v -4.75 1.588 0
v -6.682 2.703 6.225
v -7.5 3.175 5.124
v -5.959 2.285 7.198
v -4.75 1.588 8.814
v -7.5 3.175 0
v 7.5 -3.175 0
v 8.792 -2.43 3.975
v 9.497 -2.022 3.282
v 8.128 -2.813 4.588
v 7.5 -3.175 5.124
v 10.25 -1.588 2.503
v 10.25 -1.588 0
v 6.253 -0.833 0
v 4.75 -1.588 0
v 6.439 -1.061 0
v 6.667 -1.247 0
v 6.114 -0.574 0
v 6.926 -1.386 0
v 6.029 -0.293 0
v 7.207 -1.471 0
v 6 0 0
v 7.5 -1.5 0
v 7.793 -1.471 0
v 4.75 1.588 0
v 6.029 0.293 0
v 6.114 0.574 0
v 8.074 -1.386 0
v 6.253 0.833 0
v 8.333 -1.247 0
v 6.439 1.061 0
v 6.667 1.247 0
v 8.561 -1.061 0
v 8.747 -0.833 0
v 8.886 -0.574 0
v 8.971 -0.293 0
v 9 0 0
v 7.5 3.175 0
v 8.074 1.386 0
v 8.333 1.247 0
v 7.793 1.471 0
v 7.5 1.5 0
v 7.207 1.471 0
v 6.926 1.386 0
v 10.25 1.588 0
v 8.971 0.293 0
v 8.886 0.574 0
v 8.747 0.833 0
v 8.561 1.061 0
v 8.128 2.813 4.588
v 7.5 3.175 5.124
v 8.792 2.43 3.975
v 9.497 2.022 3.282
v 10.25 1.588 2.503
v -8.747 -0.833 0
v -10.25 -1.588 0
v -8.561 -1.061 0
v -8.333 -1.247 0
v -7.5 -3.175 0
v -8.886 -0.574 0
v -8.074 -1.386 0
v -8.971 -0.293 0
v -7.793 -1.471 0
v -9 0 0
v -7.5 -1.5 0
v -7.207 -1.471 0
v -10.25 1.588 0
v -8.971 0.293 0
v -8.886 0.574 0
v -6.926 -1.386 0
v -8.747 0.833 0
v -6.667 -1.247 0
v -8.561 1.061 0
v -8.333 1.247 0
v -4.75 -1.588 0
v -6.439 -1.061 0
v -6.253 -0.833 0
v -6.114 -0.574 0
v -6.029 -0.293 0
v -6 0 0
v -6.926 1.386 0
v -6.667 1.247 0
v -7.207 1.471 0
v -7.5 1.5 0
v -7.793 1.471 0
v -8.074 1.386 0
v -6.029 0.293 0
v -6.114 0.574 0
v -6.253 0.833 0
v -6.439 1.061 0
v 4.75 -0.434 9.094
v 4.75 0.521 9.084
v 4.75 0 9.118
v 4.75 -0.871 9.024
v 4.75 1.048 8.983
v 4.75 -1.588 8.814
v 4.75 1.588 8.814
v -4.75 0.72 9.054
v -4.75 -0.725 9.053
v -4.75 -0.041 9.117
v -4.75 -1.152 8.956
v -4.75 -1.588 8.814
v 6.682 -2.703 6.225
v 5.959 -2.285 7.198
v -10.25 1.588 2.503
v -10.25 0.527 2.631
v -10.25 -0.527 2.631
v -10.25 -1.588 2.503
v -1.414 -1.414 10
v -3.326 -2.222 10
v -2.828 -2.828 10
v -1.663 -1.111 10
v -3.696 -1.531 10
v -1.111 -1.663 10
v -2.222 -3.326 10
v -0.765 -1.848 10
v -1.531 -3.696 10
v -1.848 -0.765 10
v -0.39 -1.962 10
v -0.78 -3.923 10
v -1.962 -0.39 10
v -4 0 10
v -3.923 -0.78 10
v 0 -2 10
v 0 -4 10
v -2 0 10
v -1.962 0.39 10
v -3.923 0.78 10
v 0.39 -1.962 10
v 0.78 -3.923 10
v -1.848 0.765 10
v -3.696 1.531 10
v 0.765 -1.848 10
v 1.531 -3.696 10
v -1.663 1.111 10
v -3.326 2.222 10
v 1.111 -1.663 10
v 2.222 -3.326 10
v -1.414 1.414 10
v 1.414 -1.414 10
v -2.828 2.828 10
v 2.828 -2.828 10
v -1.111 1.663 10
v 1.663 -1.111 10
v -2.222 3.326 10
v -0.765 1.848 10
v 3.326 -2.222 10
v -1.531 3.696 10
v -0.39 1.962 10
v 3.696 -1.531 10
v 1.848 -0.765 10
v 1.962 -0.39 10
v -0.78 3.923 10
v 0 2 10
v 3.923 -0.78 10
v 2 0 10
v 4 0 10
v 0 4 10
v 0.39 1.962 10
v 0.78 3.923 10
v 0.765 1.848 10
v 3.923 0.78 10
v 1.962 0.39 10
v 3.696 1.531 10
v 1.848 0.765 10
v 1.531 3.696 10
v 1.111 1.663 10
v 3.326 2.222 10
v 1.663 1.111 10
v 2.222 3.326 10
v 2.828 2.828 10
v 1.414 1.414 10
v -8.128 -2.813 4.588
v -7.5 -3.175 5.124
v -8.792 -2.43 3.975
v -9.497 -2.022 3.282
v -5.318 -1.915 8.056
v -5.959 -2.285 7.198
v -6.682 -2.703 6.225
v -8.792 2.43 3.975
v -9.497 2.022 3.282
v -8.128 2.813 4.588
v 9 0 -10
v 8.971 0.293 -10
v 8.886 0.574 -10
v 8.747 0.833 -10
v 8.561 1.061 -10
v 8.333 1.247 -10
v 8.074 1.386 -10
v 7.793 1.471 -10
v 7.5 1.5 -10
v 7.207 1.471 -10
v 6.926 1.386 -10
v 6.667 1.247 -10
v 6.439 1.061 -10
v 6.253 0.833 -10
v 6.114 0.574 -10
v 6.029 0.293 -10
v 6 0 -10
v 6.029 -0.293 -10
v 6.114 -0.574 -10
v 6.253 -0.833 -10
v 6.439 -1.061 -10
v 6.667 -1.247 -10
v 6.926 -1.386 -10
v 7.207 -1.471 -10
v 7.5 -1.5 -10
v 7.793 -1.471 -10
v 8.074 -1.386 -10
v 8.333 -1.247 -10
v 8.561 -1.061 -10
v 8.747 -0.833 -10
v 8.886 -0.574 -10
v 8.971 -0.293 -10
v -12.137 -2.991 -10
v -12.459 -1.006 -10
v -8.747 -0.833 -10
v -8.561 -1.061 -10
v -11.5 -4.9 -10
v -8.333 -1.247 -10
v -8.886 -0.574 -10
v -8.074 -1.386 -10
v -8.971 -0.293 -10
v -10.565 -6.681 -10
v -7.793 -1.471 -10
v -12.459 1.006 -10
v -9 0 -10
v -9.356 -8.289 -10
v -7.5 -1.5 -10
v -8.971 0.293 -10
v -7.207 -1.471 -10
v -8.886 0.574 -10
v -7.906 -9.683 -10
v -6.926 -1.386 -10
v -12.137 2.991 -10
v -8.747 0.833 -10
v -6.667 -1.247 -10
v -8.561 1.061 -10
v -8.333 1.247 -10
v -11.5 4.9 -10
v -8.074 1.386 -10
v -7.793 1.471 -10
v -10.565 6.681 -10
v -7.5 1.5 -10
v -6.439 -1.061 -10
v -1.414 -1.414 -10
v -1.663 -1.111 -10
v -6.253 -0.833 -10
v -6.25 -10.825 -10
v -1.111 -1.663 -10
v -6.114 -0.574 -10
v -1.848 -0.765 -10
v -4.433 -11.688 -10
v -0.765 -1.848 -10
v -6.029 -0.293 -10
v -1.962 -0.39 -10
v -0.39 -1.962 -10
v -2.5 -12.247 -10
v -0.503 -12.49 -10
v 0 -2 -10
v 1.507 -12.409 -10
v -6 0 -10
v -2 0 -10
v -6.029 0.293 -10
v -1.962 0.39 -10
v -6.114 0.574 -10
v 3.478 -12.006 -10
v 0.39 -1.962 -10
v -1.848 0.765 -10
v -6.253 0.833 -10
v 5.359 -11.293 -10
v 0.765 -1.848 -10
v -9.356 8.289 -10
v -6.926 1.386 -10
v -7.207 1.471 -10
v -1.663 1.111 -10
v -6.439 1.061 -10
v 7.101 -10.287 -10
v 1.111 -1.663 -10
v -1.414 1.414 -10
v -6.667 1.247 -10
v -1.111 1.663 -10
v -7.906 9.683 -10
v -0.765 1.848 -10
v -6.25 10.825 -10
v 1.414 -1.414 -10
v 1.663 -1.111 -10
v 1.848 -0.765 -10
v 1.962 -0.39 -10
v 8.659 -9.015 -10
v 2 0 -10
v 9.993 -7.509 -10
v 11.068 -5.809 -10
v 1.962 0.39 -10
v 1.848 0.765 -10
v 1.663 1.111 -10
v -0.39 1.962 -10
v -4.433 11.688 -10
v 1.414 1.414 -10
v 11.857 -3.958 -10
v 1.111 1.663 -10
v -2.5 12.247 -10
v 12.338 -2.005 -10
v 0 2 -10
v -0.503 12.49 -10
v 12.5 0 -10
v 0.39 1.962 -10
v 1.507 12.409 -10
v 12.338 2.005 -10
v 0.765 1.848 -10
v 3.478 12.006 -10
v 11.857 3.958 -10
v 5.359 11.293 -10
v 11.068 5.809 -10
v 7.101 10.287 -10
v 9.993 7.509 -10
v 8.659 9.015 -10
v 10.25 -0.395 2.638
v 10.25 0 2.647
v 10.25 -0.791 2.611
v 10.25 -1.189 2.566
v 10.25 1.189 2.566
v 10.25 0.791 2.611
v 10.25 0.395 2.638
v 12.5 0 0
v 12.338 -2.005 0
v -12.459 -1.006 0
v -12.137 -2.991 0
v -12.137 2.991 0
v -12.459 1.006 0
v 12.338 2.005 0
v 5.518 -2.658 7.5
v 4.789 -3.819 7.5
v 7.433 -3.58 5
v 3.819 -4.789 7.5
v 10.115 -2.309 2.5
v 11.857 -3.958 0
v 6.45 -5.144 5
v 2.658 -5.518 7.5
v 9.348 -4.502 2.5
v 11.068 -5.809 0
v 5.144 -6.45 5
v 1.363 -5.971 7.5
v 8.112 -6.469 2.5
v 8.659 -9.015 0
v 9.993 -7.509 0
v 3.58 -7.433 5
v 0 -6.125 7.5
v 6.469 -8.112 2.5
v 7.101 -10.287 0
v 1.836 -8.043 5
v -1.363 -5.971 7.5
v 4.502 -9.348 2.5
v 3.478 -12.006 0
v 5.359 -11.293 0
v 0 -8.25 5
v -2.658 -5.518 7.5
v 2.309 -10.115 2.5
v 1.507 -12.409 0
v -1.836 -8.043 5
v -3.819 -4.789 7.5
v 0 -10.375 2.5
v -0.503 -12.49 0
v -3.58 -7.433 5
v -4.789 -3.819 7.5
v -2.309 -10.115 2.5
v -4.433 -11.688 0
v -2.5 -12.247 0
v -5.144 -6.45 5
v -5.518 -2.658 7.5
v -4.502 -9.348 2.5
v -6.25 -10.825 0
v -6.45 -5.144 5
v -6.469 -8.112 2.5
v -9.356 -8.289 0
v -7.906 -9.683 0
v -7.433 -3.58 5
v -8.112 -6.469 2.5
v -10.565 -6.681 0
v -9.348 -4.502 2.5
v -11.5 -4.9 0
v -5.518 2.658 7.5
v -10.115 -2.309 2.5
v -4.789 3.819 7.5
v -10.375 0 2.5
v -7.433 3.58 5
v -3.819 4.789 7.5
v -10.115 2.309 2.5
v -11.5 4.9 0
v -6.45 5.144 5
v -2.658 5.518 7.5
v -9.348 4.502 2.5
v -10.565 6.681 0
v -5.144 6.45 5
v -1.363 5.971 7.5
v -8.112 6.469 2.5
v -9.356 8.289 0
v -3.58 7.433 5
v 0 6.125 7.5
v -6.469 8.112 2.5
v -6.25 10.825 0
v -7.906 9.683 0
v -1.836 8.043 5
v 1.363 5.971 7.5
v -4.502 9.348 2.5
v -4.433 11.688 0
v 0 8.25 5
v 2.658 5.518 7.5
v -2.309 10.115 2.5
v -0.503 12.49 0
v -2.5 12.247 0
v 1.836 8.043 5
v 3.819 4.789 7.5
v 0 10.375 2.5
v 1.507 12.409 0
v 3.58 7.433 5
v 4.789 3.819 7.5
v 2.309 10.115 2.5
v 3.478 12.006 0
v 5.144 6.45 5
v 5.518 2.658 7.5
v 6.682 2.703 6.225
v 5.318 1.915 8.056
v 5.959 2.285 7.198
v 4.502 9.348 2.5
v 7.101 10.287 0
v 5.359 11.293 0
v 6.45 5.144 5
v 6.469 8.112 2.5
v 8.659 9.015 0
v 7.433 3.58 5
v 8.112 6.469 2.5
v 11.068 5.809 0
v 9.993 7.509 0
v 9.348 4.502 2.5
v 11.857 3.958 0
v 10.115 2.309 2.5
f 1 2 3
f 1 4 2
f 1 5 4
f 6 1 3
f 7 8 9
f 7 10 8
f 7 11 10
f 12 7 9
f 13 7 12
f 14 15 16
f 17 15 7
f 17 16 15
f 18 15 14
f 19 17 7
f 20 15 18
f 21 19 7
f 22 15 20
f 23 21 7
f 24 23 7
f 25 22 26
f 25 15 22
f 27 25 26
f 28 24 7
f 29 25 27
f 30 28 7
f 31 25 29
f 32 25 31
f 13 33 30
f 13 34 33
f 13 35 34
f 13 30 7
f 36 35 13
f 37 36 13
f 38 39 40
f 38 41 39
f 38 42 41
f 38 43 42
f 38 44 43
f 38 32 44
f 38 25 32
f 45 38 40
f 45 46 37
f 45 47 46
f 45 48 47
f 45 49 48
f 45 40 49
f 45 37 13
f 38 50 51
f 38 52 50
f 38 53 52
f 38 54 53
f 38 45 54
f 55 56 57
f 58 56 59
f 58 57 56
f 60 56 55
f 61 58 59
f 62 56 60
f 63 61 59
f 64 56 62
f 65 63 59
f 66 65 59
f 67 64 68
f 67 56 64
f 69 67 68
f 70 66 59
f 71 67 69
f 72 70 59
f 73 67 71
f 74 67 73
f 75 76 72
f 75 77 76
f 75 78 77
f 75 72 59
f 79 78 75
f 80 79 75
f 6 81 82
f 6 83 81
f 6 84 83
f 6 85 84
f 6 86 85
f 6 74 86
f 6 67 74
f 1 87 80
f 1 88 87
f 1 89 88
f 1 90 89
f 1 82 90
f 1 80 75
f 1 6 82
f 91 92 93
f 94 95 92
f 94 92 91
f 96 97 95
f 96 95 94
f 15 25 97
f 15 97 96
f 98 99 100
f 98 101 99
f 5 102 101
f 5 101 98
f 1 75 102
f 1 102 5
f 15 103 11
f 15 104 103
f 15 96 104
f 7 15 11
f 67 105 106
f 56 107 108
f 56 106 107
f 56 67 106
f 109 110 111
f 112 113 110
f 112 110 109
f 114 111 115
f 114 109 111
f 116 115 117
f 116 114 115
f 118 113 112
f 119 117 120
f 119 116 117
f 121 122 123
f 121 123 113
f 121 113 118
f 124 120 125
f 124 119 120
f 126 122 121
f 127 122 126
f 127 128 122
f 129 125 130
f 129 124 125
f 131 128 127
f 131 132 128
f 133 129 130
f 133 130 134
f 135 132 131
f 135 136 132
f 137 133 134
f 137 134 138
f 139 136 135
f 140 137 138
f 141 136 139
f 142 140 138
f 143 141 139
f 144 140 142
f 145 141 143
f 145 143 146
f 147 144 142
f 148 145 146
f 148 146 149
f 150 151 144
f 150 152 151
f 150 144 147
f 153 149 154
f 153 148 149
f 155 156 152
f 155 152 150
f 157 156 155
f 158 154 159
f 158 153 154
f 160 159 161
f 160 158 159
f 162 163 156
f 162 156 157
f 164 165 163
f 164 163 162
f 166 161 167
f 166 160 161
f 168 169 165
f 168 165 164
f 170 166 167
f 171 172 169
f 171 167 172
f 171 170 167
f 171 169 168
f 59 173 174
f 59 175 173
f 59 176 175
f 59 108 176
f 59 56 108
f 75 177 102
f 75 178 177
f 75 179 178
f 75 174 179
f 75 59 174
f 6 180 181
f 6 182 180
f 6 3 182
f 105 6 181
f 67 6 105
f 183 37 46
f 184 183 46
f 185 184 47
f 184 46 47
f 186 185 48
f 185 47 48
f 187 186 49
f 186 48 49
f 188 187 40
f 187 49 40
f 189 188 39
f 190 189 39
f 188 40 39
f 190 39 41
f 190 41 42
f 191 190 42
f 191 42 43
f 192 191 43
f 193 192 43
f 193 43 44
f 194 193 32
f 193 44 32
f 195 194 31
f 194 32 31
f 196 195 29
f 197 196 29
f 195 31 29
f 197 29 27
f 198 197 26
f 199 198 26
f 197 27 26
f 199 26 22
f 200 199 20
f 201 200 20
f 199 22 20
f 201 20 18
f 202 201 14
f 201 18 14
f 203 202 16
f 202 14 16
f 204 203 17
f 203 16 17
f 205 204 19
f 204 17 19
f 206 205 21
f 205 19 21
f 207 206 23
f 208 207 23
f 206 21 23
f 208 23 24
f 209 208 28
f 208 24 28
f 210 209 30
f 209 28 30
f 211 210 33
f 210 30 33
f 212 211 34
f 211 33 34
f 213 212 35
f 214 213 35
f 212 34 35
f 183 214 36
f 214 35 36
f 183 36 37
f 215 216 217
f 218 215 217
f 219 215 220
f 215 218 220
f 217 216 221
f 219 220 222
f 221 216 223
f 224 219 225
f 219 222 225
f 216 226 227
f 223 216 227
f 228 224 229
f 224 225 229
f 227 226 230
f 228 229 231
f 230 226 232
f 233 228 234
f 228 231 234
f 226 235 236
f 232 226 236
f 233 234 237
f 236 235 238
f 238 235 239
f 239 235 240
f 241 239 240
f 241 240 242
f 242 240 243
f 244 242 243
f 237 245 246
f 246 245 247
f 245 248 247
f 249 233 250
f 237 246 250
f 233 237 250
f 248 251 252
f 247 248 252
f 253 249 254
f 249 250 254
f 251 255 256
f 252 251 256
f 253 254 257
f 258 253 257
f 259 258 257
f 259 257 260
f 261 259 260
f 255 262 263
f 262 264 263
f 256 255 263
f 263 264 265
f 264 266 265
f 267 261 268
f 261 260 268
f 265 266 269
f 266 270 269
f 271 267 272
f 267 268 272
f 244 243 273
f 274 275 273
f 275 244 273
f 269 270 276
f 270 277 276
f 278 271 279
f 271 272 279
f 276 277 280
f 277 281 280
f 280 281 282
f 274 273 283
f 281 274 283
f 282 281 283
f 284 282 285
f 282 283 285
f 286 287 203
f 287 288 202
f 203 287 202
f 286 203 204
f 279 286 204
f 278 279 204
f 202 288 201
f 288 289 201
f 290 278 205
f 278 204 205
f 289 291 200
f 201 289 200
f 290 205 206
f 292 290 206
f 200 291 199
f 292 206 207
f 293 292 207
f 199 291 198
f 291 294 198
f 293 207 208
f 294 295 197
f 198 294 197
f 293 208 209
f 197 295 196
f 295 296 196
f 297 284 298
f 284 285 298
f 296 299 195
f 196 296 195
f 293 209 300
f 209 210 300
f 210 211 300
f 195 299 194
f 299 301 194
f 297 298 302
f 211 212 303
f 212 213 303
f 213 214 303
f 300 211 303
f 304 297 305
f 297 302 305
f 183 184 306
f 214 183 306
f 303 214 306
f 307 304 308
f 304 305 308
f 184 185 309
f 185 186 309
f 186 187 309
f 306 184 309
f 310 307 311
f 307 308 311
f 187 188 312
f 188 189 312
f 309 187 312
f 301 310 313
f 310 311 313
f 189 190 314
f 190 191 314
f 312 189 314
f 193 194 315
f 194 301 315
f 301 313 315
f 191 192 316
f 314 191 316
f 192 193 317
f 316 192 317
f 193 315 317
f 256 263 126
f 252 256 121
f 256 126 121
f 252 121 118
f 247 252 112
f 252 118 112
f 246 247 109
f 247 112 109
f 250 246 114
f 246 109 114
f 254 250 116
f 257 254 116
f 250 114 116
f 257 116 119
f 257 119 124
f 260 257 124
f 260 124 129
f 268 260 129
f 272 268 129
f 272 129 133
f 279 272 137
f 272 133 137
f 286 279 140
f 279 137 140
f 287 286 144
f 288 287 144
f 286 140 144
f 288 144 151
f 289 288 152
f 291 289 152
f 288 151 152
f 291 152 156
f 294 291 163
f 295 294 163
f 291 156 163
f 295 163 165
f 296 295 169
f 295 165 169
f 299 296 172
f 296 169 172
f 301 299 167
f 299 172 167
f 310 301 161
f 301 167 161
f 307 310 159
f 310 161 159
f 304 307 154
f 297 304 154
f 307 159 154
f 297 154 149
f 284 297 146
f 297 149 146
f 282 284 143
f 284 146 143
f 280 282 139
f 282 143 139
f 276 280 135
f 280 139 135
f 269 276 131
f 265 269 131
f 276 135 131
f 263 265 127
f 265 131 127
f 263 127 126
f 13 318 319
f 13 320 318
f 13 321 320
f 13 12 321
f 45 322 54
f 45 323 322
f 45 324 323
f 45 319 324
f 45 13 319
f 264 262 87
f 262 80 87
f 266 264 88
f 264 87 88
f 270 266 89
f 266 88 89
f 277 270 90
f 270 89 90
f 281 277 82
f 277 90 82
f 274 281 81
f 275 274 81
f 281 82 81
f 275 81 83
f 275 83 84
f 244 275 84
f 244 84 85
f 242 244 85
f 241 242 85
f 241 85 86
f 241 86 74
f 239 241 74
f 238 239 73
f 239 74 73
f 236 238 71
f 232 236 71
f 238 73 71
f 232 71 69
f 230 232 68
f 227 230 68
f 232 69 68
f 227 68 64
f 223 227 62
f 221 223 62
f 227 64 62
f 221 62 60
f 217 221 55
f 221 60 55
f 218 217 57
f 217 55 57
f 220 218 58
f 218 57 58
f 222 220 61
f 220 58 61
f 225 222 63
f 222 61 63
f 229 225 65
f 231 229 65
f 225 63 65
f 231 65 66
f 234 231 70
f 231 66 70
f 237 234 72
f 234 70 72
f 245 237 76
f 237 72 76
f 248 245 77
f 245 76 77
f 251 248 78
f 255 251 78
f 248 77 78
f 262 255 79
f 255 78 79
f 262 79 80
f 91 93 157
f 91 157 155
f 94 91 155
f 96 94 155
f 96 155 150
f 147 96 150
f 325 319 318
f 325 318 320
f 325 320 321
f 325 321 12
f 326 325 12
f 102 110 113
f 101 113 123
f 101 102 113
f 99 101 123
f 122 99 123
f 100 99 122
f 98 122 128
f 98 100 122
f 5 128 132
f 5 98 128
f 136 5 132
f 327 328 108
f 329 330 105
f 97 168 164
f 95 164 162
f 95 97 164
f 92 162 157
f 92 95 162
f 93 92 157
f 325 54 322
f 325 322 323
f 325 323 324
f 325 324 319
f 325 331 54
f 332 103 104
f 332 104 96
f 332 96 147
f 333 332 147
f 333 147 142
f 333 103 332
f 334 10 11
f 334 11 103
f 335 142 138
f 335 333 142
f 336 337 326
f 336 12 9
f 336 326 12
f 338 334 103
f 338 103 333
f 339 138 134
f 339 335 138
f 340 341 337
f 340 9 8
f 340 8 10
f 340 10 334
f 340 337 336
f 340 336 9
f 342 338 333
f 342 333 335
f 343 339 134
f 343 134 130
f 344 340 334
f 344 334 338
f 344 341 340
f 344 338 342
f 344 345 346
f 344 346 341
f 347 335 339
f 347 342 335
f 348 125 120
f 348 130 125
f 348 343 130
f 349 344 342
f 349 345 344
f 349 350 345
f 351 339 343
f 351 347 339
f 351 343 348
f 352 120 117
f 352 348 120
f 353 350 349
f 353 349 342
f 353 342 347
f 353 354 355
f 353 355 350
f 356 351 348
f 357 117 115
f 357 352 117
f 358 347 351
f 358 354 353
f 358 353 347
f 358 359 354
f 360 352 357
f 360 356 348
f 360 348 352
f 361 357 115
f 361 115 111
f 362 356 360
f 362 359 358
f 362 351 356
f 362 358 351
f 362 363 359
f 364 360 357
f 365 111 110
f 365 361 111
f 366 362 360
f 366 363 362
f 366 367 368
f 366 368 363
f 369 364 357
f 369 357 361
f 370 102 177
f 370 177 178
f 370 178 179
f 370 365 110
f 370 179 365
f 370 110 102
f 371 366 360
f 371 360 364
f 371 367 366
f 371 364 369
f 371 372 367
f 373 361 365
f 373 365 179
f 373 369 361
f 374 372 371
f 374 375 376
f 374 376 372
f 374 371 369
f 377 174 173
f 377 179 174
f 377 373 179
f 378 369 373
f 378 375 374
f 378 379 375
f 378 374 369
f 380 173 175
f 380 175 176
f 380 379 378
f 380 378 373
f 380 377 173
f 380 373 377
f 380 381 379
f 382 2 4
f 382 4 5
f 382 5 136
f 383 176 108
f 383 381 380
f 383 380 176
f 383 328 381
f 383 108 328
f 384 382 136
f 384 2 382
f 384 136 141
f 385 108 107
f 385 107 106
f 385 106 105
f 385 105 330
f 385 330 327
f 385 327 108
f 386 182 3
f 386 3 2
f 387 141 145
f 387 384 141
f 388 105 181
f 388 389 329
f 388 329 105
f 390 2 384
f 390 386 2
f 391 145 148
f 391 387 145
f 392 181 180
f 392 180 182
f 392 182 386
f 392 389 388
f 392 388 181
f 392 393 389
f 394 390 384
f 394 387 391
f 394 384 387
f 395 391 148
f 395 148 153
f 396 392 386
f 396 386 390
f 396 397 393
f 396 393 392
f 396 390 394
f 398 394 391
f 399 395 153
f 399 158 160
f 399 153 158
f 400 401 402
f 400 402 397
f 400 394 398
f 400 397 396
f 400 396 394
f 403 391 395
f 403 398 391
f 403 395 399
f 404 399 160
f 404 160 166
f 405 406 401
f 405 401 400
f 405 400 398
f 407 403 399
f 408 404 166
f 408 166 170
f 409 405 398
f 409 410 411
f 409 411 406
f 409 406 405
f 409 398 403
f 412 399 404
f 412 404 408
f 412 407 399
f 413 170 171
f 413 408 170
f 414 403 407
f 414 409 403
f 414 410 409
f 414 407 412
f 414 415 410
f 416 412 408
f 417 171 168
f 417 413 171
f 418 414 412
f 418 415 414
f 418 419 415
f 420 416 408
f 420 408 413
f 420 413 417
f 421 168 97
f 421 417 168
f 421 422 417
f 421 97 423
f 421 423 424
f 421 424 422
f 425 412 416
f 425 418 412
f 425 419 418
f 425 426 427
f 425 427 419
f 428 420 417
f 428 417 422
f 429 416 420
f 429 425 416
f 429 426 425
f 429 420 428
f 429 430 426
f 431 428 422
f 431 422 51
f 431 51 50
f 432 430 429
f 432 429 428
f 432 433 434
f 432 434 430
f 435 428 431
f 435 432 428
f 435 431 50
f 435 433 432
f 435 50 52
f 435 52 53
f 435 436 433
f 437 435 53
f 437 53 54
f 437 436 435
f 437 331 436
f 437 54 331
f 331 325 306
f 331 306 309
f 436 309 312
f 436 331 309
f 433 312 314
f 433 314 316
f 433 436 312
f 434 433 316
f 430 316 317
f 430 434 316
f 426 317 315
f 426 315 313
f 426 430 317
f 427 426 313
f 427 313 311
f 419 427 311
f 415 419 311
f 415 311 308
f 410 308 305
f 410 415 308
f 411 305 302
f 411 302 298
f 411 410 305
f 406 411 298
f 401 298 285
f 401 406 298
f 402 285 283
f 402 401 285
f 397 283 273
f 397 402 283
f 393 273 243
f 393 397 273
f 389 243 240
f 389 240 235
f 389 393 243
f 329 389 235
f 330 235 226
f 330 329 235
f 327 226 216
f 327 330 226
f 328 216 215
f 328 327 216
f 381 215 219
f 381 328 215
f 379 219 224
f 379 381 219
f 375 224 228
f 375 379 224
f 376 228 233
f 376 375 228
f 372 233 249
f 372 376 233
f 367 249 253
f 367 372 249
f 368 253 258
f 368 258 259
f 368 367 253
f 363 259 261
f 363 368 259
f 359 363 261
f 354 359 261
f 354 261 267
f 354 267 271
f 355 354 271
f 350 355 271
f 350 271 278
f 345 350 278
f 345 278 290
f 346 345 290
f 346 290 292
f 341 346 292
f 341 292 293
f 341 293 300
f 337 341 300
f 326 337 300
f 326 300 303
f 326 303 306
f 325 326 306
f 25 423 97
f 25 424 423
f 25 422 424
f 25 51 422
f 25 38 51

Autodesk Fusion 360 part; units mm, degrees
sketch "Boceto1" plane through (0, 0, 0) normal (0, 0, 1) x (1, 0, 0)
  circle A0 centre (0, 0) radius 12.5
  line L0 (12.5, 0) -> (-12.5, 0) construction
  circle A1 centre (0, 0) radius 4 construction
  circle A2 centre (0, 0) radius 2 construction
  circle A3 centre (7.5, 0) radius 1.5
  circle A4 centre (-7.5, 0) radius 1.5
  line L1 (7.5, -3.1754) -> (10.25, -1.5877)
  line L2 (10.25, -1.5877) -> (10.25, 1.5877)
  line L3 (10.25, 1.5877) -> (7.5, 3.1754)
  line L4 (7.5, 3.1754) -> (4.75, 1.5877)
  line L5 (4.75, 1.5877) -> (4.75, -1.5877)
  line L6 (4.75, -1.5877) -> (7.5, -3.1754)
  line L7 (-7.5, -3.1754) -> (-4.75, -1.5877)
  line L8 (-4.75, -1.5877) -> (-4.75, 1.5877)
  line L9 (-4.75, 1.5877) -> (-7.5, 3.1754)
  line L10 (-7.5, 3.1754) -> (-10.25, 1.5877)
  line L11 (-10.25, 1.5877) -> (-10.25, -1.5877)
  line L12 (-10.25, -1.5877) -> (-7.5, -3.1754)
  point P0 (7.5, 0)
  point P1 (-7.5, 0)
  dimension "d1" = 25
  dimension "d9" = 8
  dimension "d10" = 4
  dimension "d11" = 3
  dimension "d12" = 3
  dimension "d13" = 2.75
  dimension "d14" = 2.75
  dimension "d29" = 7.5
  dimension "d30" = 7.5
extrude "Extruir1" add sketch "Boceto1" against normal blind 10 contours A0 | A3 | A4 | L1 L2 L3 L4 L5 L6 | L7 L8 L9 L10 L11 L12
ref_plane "PlanoDeObra1" through (0, 0, 10) normal (0, 0, 1) x (1, 0, 0)
sketch "Boceto2" plane through (0, 0, 10) normal (0, 0, 1) x (1, 0, 0)
  circle A0 centre (0, 0) radius 12.5
  circle A1 centre (0, 0) radius 4
  dimension "d5" = -8.5
loft "Solevación1" add profiles "Boceto2" section 1 contours A1 section 2 face at (-3.3879, -0.621, 0)
sketch "Boceto3" plane through (0, 0, 10) normal (0, 0, 1) x (-1, 0, 0)
  circle A0 centre (0, 0) radius 4
  circle A1 centre (0, 0) radius 2
  dimension "d6" = 4
extrude "Extruir2" cut sketch "Boceto3" along normal mid plane 78 contours A1
sketch "Boceto4" plane through (0, 0, 10) normal (0, 0, 1) x (-1, 0, 0)
  circle A0 centre (0, 0) radius 2
  circle A1 centre (0, 0) radius 4
extrude "Extruir5" cut sketch "Boceto1" along normal blind 14 contours L1 L2 L3 L4 L5 L6
extrude "Extruir6" cut sketch "Boceto1" along normal blind 29 contours A3
extrude "Extruir7" cut sketch "Boceto1" along normal mid plane 60 contours A3
extrude "Extruir8" cut sketch "Boceto1" along normal blind 25 contours L7 L8 L9 L10 L11 L12
extrude "Extruir9" cut sketch "Boceto1" along normal mid plane 52 contours A4
